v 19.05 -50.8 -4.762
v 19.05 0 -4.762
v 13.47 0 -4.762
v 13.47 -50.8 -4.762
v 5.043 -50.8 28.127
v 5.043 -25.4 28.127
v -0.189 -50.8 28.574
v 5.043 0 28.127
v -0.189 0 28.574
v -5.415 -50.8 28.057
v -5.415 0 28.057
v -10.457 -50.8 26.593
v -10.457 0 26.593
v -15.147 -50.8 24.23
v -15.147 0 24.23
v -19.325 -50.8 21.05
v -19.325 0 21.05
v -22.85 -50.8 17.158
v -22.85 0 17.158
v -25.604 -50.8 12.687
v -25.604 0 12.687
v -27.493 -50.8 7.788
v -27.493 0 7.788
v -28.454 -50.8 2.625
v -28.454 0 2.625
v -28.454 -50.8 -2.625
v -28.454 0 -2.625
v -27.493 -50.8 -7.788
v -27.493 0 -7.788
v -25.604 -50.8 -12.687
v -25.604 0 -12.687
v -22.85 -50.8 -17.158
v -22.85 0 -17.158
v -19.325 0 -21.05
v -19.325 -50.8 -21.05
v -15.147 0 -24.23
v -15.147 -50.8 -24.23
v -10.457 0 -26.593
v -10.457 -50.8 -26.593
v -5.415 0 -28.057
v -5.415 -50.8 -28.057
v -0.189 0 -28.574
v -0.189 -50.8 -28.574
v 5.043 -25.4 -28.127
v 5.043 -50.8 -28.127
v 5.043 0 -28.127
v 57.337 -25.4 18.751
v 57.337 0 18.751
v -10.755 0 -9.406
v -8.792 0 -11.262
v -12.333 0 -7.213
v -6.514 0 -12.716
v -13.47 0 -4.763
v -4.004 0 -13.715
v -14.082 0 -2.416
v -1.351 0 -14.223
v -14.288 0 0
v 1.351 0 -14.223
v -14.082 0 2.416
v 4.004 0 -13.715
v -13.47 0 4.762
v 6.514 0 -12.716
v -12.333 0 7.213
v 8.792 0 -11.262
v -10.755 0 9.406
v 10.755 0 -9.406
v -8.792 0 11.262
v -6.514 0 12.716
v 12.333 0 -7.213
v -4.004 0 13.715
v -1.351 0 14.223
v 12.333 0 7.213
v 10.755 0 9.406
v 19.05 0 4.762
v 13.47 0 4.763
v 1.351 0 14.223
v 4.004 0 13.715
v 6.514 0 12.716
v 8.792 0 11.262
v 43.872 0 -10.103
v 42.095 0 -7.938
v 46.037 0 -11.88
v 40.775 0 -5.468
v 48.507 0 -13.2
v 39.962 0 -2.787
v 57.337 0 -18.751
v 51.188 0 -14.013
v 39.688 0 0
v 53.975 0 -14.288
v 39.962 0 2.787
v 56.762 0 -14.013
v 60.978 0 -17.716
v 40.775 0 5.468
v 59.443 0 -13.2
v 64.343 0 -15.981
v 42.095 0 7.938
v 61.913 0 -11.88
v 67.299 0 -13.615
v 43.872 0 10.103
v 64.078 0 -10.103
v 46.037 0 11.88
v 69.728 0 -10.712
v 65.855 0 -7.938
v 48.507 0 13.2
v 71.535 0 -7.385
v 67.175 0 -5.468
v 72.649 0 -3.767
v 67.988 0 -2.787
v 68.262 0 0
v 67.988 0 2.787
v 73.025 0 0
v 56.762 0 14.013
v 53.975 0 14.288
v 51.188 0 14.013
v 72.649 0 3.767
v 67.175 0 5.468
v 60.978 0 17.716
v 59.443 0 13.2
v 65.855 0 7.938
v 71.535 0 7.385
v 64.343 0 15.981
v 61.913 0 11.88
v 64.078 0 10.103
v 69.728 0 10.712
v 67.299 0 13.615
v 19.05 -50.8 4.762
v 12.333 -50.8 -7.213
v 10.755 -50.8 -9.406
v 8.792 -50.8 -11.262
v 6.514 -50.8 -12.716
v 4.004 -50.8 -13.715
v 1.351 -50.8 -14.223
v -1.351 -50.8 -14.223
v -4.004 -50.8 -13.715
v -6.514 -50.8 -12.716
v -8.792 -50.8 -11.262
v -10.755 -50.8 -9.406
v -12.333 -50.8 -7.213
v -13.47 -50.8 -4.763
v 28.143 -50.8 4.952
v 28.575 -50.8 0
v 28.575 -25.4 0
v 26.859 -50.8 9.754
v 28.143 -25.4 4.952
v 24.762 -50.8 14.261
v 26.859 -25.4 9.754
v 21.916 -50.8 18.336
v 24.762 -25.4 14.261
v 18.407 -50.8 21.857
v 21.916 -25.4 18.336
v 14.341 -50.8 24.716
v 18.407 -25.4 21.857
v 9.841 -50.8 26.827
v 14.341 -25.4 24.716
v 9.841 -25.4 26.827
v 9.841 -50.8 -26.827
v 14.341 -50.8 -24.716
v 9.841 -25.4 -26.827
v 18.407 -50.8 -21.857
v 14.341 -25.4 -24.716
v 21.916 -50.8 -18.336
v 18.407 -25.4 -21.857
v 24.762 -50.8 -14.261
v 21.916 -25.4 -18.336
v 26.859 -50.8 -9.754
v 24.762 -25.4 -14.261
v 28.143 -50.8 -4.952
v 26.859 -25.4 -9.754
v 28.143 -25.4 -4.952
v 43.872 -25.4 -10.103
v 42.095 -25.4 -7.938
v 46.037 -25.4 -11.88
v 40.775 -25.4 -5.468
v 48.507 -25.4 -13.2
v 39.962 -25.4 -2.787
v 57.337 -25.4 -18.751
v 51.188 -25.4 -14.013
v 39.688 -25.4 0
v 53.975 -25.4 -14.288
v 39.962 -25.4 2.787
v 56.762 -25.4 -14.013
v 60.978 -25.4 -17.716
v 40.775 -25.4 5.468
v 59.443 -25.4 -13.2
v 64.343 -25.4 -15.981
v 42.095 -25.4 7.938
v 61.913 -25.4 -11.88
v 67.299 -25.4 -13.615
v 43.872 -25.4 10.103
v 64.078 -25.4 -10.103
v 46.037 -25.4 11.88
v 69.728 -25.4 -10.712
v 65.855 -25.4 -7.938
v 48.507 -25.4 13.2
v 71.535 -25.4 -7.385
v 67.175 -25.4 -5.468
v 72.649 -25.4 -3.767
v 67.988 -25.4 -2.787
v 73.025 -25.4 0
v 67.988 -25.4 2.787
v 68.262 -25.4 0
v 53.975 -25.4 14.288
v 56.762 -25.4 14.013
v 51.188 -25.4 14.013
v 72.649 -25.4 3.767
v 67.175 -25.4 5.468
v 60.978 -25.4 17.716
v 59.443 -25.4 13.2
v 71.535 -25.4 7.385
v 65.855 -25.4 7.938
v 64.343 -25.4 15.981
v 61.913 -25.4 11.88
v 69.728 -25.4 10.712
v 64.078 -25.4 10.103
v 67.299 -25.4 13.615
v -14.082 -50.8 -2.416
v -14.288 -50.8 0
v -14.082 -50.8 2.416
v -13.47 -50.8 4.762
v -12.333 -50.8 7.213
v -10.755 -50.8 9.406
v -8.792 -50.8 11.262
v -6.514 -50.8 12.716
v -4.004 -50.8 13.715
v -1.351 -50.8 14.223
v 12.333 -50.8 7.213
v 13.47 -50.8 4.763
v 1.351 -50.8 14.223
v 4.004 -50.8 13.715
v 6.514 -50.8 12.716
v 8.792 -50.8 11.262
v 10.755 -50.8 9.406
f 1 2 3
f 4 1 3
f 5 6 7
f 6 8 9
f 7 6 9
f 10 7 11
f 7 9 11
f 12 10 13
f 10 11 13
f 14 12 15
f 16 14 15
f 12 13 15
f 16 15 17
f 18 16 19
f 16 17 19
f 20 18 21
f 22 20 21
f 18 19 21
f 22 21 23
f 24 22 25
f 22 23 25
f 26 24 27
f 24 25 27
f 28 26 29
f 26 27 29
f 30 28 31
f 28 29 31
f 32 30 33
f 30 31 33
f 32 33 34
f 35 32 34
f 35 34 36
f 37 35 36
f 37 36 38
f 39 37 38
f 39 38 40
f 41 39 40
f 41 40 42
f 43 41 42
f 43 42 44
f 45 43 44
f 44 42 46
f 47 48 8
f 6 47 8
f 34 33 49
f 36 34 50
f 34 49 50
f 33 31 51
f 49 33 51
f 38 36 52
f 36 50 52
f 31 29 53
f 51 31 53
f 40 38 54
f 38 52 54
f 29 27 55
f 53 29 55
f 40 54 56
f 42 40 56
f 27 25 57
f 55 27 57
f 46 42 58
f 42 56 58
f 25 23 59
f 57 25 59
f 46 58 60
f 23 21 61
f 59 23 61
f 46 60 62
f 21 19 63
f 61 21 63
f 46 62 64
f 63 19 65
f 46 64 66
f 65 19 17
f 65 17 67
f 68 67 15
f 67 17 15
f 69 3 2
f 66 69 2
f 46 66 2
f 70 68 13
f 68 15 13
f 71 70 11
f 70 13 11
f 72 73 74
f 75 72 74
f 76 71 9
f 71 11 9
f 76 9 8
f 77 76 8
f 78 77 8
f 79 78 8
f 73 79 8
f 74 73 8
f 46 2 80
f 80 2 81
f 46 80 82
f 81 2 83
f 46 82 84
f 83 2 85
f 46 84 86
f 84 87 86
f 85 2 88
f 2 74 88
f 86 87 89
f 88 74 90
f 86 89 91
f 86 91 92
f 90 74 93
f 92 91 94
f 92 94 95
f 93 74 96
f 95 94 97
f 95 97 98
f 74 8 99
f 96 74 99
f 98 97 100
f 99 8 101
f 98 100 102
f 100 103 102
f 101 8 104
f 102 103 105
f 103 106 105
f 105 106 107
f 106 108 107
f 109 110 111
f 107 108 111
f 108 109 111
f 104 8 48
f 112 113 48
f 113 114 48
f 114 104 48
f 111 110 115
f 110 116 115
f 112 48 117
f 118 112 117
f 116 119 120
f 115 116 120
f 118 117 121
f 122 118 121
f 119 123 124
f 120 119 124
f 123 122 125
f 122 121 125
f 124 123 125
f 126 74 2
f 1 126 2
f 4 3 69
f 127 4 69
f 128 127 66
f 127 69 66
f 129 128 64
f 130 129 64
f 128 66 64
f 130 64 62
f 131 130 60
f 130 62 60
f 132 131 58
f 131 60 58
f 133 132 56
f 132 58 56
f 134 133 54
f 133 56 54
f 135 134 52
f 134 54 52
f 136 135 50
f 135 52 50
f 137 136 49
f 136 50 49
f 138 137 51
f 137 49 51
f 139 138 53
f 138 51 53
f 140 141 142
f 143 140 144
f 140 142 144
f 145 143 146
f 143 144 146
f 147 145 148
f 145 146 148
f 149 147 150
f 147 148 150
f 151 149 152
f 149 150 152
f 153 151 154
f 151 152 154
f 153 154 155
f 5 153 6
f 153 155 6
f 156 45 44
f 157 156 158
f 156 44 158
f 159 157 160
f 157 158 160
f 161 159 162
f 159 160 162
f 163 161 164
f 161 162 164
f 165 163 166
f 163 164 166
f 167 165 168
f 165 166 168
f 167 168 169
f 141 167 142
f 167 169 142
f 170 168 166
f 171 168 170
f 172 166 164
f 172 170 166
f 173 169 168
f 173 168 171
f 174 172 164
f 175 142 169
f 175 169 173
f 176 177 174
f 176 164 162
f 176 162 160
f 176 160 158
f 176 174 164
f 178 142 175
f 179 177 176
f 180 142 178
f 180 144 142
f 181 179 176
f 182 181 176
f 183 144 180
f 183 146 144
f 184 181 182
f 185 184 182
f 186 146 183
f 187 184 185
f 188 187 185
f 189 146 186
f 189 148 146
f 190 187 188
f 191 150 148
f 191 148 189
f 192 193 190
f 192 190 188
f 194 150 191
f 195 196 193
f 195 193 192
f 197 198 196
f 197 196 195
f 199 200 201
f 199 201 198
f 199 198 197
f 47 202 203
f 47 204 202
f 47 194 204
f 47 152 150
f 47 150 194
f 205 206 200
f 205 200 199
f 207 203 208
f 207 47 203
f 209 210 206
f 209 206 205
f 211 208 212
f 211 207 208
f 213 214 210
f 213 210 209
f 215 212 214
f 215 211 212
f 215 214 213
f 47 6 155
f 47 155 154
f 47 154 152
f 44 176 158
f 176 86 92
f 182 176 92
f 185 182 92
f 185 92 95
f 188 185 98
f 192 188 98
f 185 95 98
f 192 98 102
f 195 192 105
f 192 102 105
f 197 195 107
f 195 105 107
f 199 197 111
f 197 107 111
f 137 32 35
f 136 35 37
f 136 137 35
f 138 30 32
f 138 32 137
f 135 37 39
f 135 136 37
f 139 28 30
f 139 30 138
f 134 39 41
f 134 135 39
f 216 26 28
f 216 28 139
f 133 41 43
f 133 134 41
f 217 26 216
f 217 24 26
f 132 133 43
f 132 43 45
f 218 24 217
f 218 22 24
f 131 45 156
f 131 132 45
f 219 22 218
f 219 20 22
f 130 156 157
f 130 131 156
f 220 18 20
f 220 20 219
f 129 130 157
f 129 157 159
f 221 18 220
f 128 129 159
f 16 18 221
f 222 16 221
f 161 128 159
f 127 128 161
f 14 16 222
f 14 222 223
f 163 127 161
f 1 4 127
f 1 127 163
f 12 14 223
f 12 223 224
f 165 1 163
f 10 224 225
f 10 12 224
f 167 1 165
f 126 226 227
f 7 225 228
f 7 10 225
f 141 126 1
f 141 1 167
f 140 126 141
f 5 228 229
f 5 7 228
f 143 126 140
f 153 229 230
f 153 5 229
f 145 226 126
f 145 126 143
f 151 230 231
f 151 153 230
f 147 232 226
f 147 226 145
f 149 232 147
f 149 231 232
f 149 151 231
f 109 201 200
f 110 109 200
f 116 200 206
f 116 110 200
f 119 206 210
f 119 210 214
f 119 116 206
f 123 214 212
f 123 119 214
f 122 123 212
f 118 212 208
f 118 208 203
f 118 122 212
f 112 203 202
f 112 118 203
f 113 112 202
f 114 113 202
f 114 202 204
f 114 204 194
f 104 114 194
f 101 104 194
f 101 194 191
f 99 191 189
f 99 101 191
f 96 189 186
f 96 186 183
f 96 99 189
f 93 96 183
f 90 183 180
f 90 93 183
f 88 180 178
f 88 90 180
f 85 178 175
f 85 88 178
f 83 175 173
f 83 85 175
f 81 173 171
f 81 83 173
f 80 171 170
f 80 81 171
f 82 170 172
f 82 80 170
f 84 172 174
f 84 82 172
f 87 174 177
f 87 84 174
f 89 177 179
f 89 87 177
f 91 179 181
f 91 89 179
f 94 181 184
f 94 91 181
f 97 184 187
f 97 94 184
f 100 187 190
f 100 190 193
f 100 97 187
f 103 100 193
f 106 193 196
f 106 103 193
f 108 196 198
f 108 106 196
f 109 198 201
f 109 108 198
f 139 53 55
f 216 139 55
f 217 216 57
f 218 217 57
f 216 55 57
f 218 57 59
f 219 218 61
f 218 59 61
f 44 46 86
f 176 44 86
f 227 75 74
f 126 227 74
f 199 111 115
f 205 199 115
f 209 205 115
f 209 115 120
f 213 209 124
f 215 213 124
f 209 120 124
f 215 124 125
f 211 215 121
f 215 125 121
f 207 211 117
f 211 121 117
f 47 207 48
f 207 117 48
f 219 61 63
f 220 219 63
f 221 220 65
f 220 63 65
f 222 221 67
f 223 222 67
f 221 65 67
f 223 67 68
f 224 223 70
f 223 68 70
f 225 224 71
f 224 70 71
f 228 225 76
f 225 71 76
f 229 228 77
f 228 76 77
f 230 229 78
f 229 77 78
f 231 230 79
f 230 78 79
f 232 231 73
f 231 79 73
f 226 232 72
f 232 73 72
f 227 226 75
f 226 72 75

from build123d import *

# Parameters (mm, degrees)
F0_R     = 14.2875
F1_DEPTH = 25.4
F2_DEPTH = 50.8


with BuildPart() as f1:
    # F0 (on Front) → F1 (new body)
    with BuildSketch(Plane.XZ):
        with BuildLine():
            ThreePointArc((5.042647, -28.126541), (21.916025, -18.336262), (28.575, 0))
            ThreePointArc((28.575, 0), (21.916025, 18.336262), (5.042647, 28.126541))
            ThreePointArc((5.042647, 28.126541), (-28.575, 0), (5.042647, -28.126541))
        make_face()
        with BuildLine():
            ThreePointArc((-13.470384, 4.7625), (0, 14.2875), (13.470384, 4.7625))
            Line((13.470384, 4.7625), (19.05, 4.7625))
            Line((19.05, 4.7625), (19.05, -4.7625))
            Line((19.05, -4.7625), (13.470384, -4.7625))
            ThreePointArc((13.470384, -4.7625), (0, -14.2875), (-13.470384, -4.7625))
            Line((-13.470384, -4.7625), (-19.05, -4.7625))
            Line((-19.05, -4.7625), (-19.05, 4.7625))
            Line((-19.05, 4.7625), (-13.470384, 4.7625))
        make_face(mode=Mode.SUBTRACT)
        with BuildLine():
            ThreePointArc((5.042647, 28.126541), (21.916025, 18.336262), (28.575, 0))
            ThreePointArc((28.575, 0), (21.916025, -18.336262), (5.042647, -28.126541))
            Line((5.042647, -28.126541), (57.336765, -18.751028))
            ThreePointArc((57.336765, -18.751028), (34.925, 0), (57.336765, 18.751028))
            Line((57.336765, 18.751028), (5.042647, 28.126541))
        make_face()
        with BuildLine():
            ThreePointArc((73.025, 0), (68.585683, 12.224174), (57.336765, 18.751028))
            ThreePointArc((57.336765, 18.751028), (34.925, 0), (57.336765, -18.751028))
            ThreePointArc((57.336765, -18.751028), (68.585683, -12.224174), (73.025, 0))
        make_face()
        with Locations((53.975, 0)):
            Circle(F0_R, mode=Mode.SUBTRACT)
        with BuildLine():
            ThreePointArc((-13.470384, -4.7625), (-14.2875, 0), (-13.470384, 4.7625))
            Line((-13.470384, 4.7625), (-19.05, 4.7625))
            Line((-19.05, 4.7625), (-19.05, -4.7625))
            Line((-19.05, -4.7625), (-13.470384, -4.7625))
        make_face()
    extrude(amount=F1_DEPTH)

    # F0 (on Front) → F2 (join)
    with BuildSketch(Plane.XZ):
        with BuildLine():
            ThreePointArc((5.042647, -28.126541), (21.916025, -18.336262), (28.575, 0))
            ThreePointArc((28.575, 0), (21.916025, 18.336262), (5.042647, 28.126541))
            ThreePointArc((5.042647, 28.126541), (-28.575, 0), (5.042647, -28.126541))
        make_face()
        with BuildLine():
            ThreePointArc((-13.470384, 4.7625), (0, 14.2875), (13.470384, 4.7625))
            Line((13.470384, 4.7625), (19.05, 4.7625))
            Line((19.05, 4.7625), (19.05, -4.7625))
            Line((19.05, -4.7625), (13.470384, -4.7625))
            ThreePointArc((13.470384, -4.7625), (0, -14.2875), (-13.470384, -4.7625))
            Line((-13.470384, -4.7625), (-19.05, -4.7625))
            Line((-19.05, -4.7625), (-19.05, 4.7625))
            Line((-19.05, 4.7625), (-13.470384, 4.7625))
        make_face(mode=Mode.SUBTRACT)
        with BuildLine():
            ThreePointArc((-13.470384, -4.7625), (-14.2875, 0), (-13.470384, 4.7625))
            Line((-13.470384, 4.7625), (-19.05, 4.7625))
            Line((-19.05, 4.7625), (-19.05, -4.7625))
            Line((-19.05, -4.7625), (-13.470384, -4.7625))
        make_face()
    extrude(amount=F2_DEPTH)


solid = f1.part
